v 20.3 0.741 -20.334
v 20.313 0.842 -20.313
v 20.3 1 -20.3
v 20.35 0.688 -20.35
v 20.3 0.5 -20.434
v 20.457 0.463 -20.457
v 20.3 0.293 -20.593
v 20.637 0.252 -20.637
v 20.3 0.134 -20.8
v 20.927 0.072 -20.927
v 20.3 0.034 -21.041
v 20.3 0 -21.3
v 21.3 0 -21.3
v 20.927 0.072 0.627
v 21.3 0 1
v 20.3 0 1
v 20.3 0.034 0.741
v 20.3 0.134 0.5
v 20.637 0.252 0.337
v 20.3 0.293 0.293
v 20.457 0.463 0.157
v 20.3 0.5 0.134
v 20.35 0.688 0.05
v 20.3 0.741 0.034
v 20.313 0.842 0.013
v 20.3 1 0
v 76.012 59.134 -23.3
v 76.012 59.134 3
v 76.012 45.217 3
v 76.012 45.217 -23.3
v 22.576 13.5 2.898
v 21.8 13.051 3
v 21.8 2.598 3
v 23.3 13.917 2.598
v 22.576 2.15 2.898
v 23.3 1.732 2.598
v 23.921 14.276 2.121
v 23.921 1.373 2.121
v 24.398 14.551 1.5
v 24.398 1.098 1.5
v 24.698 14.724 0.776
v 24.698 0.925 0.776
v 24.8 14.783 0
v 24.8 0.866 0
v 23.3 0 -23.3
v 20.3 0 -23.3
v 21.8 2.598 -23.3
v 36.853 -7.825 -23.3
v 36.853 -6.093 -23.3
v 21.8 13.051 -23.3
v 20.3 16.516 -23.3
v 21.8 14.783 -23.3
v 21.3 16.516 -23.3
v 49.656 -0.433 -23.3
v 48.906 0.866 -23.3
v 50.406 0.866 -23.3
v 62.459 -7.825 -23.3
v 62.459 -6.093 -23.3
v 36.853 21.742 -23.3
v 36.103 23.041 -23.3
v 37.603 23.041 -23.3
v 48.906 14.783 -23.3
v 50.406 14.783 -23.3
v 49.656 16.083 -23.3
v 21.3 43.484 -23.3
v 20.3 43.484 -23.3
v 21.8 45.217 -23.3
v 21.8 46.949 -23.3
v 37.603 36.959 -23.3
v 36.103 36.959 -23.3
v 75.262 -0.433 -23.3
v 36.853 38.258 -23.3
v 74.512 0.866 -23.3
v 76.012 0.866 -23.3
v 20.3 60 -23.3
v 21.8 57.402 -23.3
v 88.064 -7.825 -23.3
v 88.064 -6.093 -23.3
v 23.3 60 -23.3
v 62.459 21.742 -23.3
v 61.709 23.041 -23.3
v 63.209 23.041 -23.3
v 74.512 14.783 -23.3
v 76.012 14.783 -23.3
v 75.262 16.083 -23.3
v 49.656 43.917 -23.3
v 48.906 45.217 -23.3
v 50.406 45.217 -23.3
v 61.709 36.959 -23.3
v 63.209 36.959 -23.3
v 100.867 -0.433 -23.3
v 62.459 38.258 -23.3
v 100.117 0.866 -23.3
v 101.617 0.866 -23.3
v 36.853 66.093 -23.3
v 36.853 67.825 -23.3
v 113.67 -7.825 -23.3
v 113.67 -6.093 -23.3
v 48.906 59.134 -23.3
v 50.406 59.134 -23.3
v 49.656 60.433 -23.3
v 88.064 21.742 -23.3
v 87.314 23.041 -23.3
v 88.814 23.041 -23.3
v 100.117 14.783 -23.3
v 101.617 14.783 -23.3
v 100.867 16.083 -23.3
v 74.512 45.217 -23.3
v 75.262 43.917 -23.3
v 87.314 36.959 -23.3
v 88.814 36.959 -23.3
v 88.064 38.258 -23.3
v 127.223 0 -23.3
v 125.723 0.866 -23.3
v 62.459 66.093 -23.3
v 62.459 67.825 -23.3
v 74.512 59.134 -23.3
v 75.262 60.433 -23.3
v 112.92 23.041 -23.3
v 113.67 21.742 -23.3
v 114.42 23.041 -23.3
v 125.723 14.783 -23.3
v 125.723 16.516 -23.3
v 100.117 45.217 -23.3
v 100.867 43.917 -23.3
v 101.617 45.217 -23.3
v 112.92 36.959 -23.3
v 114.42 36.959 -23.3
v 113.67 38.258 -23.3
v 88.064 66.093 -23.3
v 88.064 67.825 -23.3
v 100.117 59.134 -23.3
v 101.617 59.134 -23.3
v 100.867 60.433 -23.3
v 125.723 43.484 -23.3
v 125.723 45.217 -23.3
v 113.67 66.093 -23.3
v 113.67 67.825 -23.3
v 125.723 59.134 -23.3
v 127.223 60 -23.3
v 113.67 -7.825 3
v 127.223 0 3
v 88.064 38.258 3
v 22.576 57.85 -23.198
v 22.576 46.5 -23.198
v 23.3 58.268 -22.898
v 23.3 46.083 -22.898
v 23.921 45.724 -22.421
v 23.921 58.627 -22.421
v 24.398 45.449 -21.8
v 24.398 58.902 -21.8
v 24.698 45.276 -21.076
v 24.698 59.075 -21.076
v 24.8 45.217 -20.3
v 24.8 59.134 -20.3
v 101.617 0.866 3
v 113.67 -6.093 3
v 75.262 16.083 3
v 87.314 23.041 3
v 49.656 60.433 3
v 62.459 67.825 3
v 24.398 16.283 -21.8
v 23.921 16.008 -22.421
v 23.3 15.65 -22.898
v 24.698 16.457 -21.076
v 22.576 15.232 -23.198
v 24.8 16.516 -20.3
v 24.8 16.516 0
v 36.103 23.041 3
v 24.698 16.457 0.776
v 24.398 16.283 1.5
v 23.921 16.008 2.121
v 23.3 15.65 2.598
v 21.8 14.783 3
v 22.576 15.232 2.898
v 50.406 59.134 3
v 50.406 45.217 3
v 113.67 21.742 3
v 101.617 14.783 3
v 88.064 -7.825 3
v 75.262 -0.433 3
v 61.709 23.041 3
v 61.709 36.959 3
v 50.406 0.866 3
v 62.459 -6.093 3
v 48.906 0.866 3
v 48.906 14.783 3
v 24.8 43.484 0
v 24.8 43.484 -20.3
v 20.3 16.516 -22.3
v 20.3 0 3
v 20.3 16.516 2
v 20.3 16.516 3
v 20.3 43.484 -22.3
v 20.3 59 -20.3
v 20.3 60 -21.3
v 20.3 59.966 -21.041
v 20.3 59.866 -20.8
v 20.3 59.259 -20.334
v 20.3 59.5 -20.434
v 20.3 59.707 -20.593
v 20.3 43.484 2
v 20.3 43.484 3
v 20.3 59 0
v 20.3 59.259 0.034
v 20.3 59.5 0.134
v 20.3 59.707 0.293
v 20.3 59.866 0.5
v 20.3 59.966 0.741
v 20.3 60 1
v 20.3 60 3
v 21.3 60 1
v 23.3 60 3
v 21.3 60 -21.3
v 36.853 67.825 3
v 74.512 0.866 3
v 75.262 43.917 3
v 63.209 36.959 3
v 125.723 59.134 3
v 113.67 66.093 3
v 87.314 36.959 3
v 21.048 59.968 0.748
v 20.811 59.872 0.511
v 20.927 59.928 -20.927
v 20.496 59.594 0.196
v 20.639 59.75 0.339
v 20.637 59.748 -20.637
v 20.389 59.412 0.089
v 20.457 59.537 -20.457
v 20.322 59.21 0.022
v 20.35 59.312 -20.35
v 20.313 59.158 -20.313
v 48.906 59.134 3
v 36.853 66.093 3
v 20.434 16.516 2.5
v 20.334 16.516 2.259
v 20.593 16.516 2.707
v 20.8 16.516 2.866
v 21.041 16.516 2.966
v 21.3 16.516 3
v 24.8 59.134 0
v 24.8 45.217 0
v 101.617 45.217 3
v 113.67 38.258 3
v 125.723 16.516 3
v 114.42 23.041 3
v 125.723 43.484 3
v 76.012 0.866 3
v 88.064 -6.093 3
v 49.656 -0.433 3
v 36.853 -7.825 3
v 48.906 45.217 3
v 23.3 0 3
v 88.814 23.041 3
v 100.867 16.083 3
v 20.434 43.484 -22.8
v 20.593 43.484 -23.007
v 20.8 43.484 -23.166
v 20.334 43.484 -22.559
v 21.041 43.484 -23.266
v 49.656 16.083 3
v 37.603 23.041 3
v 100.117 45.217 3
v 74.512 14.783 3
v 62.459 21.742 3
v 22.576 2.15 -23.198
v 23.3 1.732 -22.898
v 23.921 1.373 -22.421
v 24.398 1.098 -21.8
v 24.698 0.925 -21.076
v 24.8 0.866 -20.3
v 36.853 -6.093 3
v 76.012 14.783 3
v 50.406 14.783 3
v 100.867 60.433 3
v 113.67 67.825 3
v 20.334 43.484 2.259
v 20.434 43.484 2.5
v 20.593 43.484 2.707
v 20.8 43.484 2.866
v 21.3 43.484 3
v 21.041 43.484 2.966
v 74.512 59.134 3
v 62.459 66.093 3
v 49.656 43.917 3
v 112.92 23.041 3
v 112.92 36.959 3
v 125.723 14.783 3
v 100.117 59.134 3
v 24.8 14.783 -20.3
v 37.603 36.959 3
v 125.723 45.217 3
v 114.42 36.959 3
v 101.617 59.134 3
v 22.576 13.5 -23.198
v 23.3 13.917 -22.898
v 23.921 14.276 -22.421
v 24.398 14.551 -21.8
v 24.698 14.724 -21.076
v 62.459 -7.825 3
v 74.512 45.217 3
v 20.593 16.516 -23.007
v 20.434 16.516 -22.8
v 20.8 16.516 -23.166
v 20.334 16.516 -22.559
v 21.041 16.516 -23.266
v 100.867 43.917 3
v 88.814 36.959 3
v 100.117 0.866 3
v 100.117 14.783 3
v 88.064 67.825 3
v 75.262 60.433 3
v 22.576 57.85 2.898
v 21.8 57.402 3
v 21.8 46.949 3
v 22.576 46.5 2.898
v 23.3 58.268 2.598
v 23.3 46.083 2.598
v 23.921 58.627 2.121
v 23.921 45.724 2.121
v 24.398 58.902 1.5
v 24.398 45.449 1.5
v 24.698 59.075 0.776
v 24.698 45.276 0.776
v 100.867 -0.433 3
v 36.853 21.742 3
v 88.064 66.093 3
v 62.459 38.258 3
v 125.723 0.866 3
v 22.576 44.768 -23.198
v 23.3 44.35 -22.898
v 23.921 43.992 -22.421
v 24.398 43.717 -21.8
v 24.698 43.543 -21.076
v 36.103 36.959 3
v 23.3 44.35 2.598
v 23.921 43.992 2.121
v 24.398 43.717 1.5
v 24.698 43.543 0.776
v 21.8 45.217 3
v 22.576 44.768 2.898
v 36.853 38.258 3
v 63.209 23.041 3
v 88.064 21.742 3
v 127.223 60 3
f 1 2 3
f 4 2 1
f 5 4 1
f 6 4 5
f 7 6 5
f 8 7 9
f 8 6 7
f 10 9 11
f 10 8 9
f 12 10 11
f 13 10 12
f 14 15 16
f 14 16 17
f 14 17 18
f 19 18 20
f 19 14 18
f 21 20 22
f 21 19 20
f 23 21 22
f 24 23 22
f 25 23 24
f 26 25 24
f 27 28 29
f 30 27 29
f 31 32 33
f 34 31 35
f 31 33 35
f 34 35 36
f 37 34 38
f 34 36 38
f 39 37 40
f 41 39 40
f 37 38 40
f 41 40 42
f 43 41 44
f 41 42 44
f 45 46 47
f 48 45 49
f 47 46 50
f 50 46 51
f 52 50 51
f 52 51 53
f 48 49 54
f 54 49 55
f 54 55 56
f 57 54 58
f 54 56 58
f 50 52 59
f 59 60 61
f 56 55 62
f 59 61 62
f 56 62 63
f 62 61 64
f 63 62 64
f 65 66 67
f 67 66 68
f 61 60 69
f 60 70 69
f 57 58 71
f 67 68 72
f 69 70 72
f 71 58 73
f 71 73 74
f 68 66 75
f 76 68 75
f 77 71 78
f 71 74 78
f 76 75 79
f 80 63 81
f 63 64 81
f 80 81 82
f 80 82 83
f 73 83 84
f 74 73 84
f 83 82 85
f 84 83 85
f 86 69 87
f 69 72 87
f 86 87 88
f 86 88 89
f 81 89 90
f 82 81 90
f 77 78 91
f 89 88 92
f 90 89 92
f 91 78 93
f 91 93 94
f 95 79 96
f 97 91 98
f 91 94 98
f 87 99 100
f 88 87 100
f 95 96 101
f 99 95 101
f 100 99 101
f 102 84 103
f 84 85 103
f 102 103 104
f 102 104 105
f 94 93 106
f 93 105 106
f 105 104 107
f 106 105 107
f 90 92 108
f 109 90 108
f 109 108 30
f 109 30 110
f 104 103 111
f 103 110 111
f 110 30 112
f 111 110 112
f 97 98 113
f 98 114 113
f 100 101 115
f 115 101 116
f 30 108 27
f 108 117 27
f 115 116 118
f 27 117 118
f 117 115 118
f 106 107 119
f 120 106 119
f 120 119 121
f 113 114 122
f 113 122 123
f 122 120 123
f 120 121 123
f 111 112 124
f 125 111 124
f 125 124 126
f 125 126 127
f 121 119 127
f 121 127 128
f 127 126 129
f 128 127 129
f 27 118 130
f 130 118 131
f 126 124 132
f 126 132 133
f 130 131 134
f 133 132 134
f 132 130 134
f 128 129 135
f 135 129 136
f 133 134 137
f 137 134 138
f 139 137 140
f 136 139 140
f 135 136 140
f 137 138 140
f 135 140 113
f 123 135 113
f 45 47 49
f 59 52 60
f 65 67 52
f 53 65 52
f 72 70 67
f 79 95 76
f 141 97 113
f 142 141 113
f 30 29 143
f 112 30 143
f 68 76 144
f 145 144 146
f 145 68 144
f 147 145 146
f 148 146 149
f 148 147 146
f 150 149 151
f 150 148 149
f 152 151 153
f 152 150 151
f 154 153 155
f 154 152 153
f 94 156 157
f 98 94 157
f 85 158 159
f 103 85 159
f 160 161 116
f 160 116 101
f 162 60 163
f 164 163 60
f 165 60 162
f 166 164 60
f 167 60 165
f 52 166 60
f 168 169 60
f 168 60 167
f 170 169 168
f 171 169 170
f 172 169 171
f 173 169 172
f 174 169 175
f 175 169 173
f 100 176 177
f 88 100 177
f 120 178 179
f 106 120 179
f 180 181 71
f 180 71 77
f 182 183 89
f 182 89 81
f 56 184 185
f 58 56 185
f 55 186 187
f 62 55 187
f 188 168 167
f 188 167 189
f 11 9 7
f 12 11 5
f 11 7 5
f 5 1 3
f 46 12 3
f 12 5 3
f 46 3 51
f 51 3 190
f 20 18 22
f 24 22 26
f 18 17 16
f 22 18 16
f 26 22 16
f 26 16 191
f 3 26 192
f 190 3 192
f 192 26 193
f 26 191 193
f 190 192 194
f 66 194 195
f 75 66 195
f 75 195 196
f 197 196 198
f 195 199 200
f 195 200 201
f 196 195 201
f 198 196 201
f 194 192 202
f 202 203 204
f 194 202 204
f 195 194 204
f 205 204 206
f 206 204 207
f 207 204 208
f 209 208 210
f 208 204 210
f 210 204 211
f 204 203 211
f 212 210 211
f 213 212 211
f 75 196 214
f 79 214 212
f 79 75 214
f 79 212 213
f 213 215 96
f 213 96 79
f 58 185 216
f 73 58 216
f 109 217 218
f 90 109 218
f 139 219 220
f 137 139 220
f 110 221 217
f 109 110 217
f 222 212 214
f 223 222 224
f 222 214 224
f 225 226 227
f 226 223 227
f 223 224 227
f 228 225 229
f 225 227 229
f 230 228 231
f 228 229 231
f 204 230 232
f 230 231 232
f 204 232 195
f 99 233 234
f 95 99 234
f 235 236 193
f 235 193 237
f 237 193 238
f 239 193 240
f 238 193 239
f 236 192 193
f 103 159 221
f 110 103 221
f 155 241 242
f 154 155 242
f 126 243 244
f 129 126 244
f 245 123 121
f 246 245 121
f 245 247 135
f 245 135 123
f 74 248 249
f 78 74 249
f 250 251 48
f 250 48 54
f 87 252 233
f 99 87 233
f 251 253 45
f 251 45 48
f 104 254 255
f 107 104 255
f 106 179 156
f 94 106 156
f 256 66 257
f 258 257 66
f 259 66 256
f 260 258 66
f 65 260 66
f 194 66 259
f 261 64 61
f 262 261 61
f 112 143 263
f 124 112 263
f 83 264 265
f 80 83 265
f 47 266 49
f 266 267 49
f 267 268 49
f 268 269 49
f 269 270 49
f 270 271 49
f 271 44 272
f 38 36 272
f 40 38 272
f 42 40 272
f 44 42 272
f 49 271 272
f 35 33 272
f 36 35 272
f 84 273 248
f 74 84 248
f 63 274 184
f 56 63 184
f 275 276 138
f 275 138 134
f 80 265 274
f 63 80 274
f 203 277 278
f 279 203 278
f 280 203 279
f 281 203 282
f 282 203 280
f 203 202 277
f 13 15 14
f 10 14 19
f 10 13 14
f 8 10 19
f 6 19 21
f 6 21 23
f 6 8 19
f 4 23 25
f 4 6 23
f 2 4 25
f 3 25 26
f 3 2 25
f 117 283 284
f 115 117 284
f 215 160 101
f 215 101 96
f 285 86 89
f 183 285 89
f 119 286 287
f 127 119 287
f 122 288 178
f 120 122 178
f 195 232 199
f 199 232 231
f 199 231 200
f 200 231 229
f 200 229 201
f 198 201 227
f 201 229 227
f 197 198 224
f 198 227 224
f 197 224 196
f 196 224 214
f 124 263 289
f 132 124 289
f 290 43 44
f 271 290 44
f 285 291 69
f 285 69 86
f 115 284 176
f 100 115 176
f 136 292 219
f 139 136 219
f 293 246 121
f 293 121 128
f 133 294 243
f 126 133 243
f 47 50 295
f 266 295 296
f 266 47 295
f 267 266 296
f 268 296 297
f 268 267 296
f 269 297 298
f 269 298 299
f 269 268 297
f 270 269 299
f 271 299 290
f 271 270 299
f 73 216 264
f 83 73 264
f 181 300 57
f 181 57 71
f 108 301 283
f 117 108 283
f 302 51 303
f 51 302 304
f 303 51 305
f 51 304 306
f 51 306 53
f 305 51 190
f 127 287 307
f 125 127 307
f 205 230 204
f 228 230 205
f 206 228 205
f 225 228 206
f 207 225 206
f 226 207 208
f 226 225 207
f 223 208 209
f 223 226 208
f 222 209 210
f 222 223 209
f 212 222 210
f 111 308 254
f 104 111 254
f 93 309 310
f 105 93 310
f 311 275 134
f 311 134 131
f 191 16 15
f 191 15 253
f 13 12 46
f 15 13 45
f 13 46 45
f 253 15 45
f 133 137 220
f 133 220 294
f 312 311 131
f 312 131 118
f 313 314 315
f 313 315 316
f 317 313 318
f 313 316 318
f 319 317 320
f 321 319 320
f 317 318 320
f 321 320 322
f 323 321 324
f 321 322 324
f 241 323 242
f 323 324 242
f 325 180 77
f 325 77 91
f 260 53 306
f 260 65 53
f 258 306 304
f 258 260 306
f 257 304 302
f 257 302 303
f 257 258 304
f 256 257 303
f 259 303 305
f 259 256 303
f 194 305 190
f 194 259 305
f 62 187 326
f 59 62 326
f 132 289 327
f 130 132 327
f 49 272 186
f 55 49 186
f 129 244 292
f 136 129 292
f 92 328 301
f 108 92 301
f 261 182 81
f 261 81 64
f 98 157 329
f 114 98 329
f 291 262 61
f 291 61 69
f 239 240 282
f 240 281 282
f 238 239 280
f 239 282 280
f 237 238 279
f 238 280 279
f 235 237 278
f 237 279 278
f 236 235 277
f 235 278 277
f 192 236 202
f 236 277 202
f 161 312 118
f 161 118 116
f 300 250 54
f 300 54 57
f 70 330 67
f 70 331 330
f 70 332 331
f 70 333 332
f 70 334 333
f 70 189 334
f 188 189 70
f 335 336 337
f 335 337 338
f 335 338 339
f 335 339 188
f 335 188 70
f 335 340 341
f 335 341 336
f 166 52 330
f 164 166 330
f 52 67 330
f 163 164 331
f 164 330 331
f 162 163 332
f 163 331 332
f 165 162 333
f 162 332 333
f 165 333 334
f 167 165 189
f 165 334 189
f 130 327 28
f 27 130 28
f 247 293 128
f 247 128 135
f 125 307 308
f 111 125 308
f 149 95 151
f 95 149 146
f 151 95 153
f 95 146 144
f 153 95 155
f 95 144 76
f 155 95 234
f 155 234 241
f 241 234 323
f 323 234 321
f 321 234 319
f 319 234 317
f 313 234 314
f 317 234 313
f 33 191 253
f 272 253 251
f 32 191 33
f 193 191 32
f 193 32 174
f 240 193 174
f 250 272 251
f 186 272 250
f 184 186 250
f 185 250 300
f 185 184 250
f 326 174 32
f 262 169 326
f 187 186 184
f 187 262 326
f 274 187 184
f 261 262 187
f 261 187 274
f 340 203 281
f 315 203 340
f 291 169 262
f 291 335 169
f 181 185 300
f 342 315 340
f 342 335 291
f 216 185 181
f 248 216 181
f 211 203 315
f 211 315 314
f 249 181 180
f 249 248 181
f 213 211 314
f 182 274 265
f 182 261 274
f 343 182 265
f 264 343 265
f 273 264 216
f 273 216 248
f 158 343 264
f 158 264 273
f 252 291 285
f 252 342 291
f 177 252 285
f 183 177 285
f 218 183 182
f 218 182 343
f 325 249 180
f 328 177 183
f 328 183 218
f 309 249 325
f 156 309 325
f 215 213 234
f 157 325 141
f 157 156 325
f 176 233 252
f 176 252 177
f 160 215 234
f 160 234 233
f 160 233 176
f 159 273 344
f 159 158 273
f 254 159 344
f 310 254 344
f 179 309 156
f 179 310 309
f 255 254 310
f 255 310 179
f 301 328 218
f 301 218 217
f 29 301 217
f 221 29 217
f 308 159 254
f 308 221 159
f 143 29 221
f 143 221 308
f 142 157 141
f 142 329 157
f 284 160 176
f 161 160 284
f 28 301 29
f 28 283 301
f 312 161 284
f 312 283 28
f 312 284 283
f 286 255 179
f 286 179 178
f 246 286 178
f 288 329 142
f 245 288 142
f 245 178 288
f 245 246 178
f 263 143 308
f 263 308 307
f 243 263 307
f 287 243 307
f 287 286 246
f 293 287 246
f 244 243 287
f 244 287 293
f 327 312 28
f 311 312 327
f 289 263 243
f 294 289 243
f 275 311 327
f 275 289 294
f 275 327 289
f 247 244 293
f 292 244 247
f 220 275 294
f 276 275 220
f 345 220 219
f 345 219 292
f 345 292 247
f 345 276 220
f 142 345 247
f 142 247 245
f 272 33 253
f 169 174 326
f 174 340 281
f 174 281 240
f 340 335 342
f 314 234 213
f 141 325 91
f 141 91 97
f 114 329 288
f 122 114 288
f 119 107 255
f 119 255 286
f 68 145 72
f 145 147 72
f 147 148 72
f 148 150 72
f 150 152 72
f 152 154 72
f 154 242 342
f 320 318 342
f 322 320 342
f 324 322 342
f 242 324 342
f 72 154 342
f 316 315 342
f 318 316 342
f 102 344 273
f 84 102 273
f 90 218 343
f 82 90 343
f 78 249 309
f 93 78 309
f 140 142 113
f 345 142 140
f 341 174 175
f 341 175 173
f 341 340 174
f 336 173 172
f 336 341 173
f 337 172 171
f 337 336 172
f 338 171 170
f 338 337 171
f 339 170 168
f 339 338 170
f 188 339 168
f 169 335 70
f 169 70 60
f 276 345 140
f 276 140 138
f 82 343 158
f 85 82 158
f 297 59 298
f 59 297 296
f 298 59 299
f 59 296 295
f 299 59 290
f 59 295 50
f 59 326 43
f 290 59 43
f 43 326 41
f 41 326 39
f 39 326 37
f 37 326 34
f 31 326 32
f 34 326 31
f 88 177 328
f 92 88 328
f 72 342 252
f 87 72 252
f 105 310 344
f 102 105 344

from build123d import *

# Parameters (mm, degrees)
SKETCH1_W                  = 26.3
SKETCH1_H                  = 26.3
SKETCH1_W_2                = 20.3
SKETCH1_H_2                = 20.3
TUBE_EXTRUDE_DEPTH         = 60
HEX_EXTRUDE_DEPTH          = 26.3
SKETCH3_W                  = 23.3
SKETCH3_H                  = 26.968911086
TUBE_CENTER_CUT_DEPTH      = 1
TUBE_CENTER_CUT_DEPTH_BACK = 27.3
CUT_EXTRUDE1_START         = -3
CUT_EXTRUDE1_DEPTH         = 3
SKETCH5_W                  = 1
SKETCH5_H                  = 10.515544457
CUT_EXTRUDE2_DEPTH         = 27.3
FILLET1_R                  = 3
FILLET2_R                  = 1
SKETCH6_W                  = 23.3
SKETCH6_H                  = 60
CUT_EXTRUDE3_DEPTH         = 27.3


with BuildPart() as part:
    # Sketch1 → Tube Extrude (new body)
    with BuildSketch(Plane(origin=(0, 0, 0), x_dir=(1, 0, 0), z_dir=(0, 1, 0))):
        with Locations((10.15, 10.15)):
            Rectangle(SKETCH1_W, SKETCH1_H)
        with Locations((10.15, 10.15)):
            Rectangle(SKETCH1_W_2, SKETCH1_H_2, mode=Mode.SUBTRACT)
    extrude(amount=TUBE_EXTRUDE_DEPTH)

    # Sketch2 → Hex Extrude (add)
    with BuildSketch(Plane.XY.offset(3)):
        Polygon((23.3, 15.649519053), (23.3, 0), (36.852881057, -7.824759526), (49.655762114, -0.433012702), (62.45864317, -7.824759526), (75.261524227, -0.433012702), (88.064405284, -7.824759526), (100.867286341, -0.433012702), (113.670167397, -7.824759526), (127.223048454, 0), (127.223048454, 15.649519053), (127.223048454, 44.350480947), (127.223048454, 60), (113.670167397, 67.824759526), (100.867286341, 60.433012702), (88.064405284, 67.824759526), (75.261524227, 60.433012702), (62.45864317, 67.824759526), (49.655762114, 60.433012702), (36.852881057, 67.824759526), (23.3, 60), (23.3, 44.350480947), align=None)
        Polygon((49.655762114, 16.082531755), (37.602881057, 23.041265877), (37.602881057, 36.958734123), (49.655762114, 43.917468245), (61.70864317, 36.958734123), (61.70864317, 23.041265877), align=None, mode=Mode.SUBTRACT)
        Polygon((36.102881057, 23.041265877), (24.8, 16.515544457), (24.8, 43.484455543), (36.102881057, 36.958734123), align=None, mode=Mode.SUBTRACT)
        Polygon((24.8, 0.866025404), (36.852881057, -6.092708719), (48.905762114, 0.866025404), (48.905762114, 14.783493649), (36.852881057, 21.742227772), (24.8, 14.783493649), align=None, mode=Mode.SUBTRACT)
        Polygon((50.405762114, 0.866025404), (62.45864317, -6.092708719), (74.511524227, 0.866025404), (74.511524227, 14.783493649), (62.45864317, 21.742227772), (50.405762114, 14.783493649), align=None, mode=Mode.SUBTRACT)
        Polygon((76.011524227, 0.866025404), (88.064405284, -6.092708719), (100.117286341, 0.866025404), (100.117286341, 14.783493649), (88.064405284, 21.742227772), (76.011524227, 14.783493649), align=None, mode=Mode.SUBTRACT)
        Polygon((125.723048454, 16.515544457), (114.420167397, 23.041265877), (114.420167397, 36.958734123), (125.723048454, 43.484455543), align=None, mode=Mode.SUBTRACT)
        Polygon((101.617286341, 0.866025404), (113.670167397, -6.092708719), (125.723048454, 0.866025404), (125.723048454, 14.783493649), (113.670167397, 21.742227772), (101.617286341, 14.783493649), align=None, mode=Mode.SUBTRACT)
        Polygon((24.8, 45.216506351), (36.852881057, 38.257772228), (48.905762114, 45.216506351), (48.905762114, 59.133974596), (36.852881057, 66.092708719), (24.8, 59.133974596), align=None, mode=Mode.SUBTRACT)
        Polygon((50.405762114, 45.216506351), (62.45864317, 38.257772228), (74.511524227, 45.216506351), (74.511524227, 59.133974596), (62.45864317, 66.092708719), (50.405762114, 59.133974596), align=None, mode=Mode.SUBTRACT)
        Polygon((76.011524227, 45.216506351), (88.064405284, 38.257772228), (100.117286341, 45.216506351), (100.117286341, 59.133974596), (88.064405284, 66.092708719), (76.011524227, 59.133974596), align=None, mode=Mode.SUBTRACT)
        Polygon((101.617286341, 45.216506351), (113.670167397, 38.257772228), (125.723048454, 45.216506351), (125.723048454, 59.133974596), (113.670167397, 66.092708719), (101.617286341, 59.133974596), align=None, mode=Mode.SUBTRACT)
        Polygon((75.261524227, 16.082531755), (87.314405284, 23.041265877), (87.314405284, 36.958734123), (75.261524227, 43.917468245), (63.20864317, 36.958734123), (63.20864317, 23.041265877), align=None, mode=Mode.SUBTRACT)
        Polygon((100.867286341, 16.082531755), (112.920167397, 23.041265877), (112.920167397, 36.958734123), (100.867286341, 43.917468245), (88.814405284, 36.958734123), (88.814405284, 23.041265877), align=None, mode=Mode.SUBTRACT)
    extrude(amount=-HEX_EXTRUDE_DEPTH)

    # Sketch3 → Tube Center Cut (cut, two sides)
    with BuildSketch(Plane.XY.offset(3)) as tube_center_cut_sk:
        with Locations((8.65, 30)):
            Rectangle(SKETCH3_W, SKETCH3_H)
    extrude(amount=TUBE_CENTER_CUT_DEPTH, mode=Mode.SUBTRACT)
    extrude(tube_center_cut_sk.sketch, amount=-TUBE_CENTER_CUT_DEPTH_BACK, mode=Mode.SUBTRACT)

    # Sketch4 → Cut-Extrude1 (cut)
    with BuildSketch(Plane.ZY.offset(3).offset(CUT_EXTRUDE1_START)):
        Polygon((-10.15, 60), (-10.35, 60), (-10.35, 0), (-10.15, 0), (-9.95, 0), (-9.95, 60), align=None)
    extrude(amount=CUT_EXTRUDE1_DEPTH, mode=Mode.SUBTRACT)

    # Sketch5 → Cut-Extrude2 (cut, through all)
    with BuildSketch(Plane.XY.offset(3)):
        with Locations((-2.5, 51.742227771)):
            Rectangle(SKETCH5_W, SKETCH5_H)
        with Locations((-2.5, 8.257772229)):
            Rectangle(SKETCH5_W, SKETCH5_H)
    extrude(amount=-CUT_EXTRUDE2_DEPTH, mode=Mode.SUBTRACT)

    # Fillet1
    fillet1_edges = [part.edges().sort_by_distance(p)[0] for p in [
        (-2, 51.742227772, -23.3),
        (-2, 51.742227772, 3),
        (-2, 8.257772228, -23.3),
        (-2, 8.257772228, 3),
        (24.8, 52.175240474, -23.3),
        (24.8, 52.175240474, 3),
        (24.8, 7.824759526, -23.3),
        (24.8, 7.824759526, 3),
        (24.8, 30, 3),
        (24.8, 30, -23.3),
    ]]
    fillet(fillet1_edges, radius=FILLET1_R)

    # Fillet2
    fillet2_edges = [part.edges().sort_by_distance(p)[0] for p in [
        (0, 0, -15.325),
        (10.15, 0, 0),
        (20.3, 0, -10.15),
        (10.15, 0, -20.3),
        (0, 60, -15.325),
        (10.15, 60, 0),
        (20.3, 60, -10.15),
        (10.15, 60, -20.3),
        (10.15, 43.484455543, -20.3),
        (10.15, 16.515544457, -20.3),
        (-3, 15.015544457, -23.3),
        (-3, 15.015544457, 3),
        (20.3, 30, 3),
        (10.15, 16.515544457, 0),
        (0, 16.515544457, -4.975),
        (0, 43.484455543, -15.325),
        (10.15, 43.484455543, 0),
        (20.3, 30, -23.3),
        (0, 43.484455543, -4.975),
        (0, 16.515544457, -15.325),
        (0, 60, -4.975),
        (0, 0, -4.975),
        (-3, 1.5, -23.3),
        (-3, 44.984455543, -23.3),
        (-3, 1.5, 3),
        (-3, 44.984455543, 3),
        (-3, 58.5, -23.3),
        (-3, 58.5, 3),
    ]]
    fillet(fillet2_edges, radius=FILLET2_R)

    # Sketch6 → Cut-Extrude3 (cut, through all)
    with BuildSketch(Plane.XY.offset(3)):
        with Locations((8.65, 30)):
            Rectangle(SKETCH6_W, SKETCH6_H)
    extrude(amount=-CUT_EXTRUDE3_DEPTH, mode=Mode.SUBTRACT)


solid = part.part
